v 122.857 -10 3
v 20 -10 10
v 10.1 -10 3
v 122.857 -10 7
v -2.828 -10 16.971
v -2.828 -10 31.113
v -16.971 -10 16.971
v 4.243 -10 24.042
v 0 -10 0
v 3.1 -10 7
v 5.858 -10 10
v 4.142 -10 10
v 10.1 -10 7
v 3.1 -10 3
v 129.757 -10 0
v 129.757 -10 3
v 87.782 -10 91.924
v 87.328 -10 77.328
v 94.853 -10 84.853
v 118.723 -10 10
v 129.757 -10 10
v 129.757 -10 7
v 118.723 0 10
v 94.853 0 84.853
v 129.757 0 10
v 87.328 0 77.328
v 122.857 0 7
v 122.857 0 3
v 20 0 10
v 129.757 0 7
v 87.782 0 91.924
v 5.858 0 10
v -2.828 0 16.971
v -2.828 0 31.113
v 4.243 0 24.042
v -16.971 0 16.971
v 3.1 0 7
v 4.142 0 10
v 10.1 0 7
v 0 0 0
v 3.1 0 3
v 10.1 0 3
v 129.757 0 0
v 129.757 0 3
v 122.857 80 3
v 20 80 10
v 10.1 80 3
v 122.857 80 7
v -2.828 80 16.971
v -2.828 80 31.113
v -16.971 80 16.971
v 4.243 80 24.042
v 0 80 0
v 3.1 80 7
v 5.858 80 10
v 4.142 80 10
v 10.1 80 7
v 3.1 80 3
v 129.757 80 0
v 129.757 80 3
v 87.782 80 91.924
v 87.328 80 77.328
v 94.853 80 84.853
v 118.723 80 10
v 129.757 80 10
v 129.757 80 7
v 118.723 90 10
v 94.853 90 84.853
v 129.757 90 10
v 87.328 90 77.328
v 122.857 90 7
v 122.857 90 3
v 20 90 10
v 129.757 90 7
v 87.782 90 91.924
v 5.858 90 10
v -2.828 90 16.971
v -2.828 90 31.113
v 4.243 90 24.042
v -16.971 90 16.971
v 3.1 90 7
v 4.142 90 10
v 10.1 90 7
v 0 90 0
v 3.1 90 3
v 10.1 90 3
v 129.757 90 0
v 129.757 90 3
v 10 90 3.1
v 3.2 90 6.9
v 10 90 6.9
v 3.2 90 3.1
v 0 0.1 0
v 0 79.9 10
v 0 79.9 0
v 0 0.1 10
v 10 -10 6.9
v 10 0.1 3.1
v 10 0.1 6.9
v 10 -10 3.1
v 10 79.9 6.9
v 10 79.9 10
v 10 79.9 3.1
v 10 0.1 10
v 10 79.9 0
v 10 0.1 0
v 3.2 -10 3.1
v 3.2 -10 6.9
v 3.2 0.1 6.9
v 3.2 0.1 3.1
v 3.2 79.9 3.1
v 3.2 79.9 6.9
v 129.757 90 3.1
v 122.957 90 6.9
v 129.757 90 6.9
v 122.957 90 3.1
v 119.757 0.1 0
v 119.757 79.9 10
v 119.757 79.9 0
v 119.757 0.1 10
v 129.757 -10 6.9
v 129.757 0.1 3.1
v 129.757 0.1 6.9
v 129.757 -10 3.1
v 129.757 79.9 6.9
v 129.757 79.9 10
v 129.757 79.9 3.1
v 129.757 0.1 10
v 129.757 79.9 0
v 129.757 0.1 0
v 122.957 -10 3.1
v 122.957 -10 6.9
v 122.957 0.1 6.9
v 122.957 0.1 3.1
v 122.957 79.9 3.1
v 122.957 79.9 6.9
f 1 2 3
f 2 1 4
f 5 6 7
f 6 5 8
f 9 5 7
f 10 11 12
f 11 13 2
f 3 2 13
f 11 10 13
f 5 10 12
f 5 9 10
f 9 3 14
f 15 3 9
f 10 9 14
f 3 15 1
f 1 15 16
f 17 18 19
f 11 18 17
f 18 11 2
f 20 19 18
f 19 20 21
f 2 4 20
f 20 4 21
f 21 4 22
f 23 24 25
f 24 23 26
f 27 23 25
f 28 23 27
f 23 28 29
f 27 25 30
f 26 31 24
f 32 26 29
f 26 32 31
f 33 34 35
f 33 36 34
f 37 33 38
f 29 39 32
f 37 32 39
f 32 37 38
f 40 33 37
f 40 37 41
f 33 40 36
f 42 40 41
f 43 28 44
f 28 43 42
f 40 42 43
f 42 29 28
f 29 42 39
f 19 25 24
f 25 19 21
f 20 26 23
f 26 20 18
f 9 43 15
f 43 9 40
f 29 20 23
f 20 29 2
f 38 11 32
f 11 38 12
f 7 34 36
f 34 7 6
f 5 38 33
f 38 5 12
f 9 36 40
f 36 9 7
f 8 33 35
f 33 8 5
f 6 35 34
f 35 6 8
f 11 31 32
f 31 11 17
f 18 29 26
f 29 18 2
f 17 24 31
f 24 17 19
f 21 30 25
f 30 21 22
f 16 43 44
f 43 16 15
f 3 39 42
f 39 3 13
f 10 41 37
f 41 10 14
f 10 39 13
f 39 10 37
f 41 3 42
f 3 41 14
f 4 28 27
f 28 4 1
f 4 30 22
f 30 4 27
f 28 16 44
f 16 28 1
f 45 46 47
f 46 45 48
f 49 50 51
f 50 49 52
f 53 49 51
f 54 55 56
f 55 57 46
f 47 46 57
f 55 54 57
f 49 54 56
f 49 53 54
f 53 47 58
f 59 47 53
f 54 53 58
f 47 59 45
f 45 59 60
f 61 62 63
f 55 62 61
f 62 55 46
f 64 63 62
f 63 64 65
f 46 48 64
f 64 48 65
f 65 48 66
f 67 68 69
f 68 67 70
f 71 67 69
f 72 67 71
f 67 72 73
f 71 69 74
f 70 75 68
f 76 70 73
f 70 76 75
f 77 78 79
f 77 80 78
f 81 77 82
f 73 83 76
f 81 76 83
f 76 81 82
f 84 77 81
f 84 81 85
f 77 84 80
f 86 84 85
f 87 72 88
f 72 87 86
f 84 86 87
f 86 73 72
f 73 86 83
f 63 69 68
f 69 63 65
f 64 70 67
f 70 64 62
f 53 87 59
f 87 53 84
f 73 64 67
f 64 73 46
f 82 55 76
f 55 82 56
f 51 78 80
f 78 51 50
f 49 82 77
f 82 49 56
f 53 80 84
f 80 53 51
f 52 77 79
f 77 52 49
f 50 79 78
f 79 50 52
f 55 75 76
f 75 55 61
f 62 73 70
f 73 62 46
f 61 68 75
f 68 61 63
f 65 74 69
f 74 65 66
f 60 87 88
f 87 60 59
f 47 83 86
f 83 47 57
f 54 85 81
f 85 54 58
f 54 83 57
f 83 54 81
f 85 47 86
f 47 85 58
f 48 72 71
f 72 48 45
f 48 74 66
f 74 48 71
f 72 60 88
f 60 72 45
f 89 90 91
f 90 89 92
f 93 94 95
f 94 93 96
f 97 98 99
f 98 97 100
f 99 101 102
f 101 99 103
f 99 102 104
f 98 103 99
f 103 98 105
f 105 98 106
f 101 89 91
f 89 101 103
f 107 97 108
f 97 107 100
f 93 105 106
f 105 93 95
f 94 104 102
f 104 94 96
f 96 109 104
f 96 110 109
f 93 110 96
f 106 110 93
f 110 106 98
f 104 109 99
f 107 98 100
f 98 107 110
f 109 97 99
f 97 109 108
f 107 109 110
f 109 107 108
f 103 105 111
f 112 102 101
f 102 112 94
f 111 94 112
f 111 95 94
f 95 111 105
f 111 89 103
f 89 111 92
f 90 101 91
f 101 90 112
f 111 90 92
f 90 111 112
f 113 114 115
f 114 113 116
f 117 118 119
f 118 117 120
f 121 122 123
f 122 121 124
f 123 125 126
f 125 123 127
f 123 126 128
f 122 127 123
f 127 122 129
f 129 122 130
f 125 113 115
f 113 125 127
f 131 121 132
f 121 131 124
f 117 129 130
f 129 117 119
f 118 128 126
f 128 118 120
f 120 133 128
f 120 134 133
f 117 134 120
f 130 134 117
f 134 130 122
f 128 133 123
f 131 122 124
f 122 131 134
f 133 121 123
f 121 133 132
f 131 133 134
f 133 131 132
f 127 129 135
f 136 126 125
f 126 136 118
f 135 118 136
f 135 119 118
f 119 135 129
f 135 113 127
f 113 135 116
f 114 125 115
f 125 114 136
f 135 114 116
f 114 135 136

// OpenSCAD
// [FL_INDEX: keywords="openscad, 3d_parametric, Customizable_iPad_Stand, csg_solid" | COT="Parametric OpenSCAD design from 3DCodeverse"]
// Title: Customizable iPad Stand


// preview[view:south west, tilt:top diagonal]

// Angle of iPad on stand;
Angle = 45; // [10:80]
// Angle of back support;
BackAngle = 25; // [10:80]
// Length of support
SupportLength = 120; // [50:240]
// Length of connecting bars
BarLength = 80; // [20:200]
Tolerance = 0.1; // [0, 0.1, 0.2, 0.3, 0.4, 0.5]


part = "Assembled"; // [Assembled: Assembled, Side: Side, Bar: Bar]


SubAngle = -(90-Angle);

SharedAngle = -SubAngle + BackAngle;
comp = (10/sin(SharedAngle));

truecomp = (SharedAngle > 90 ? comp : (SharedAngle == 90 ? 1 : 0));

echo(truecomp);


SubBackAngle = (90-BackAngle);

if(part=="Assembled")
{
	rotate([90, 0, 0]) Leg(Angle, BackAngle, SupportLength, Tolerance);
	
	translate([0, BarLength+10, 0])rotate([90, 0, 0]) Leg(Angle, BackAngle, SupportLength, Tolerance);
	rotate([-90, 0, 90]) translate([-10, -10, -10]) Bar(BarLength, Tolerance);
	rotate([-90, 0, 90]) translate([-10, -10, -10 - (cos(Angle)*SupportLength + sin(BackAngle)*(sin(Angle)*SupportLength)/cos(BackAngle)-10 + 10 - 10*tan(BackAngle))]) Bar(BarLength, Tolerance);
}
if(part=="Side")
{
	Leg(Angle, BackAngle, SupportLength, Tolerance);
}
if(part=="Bar")
{
	Bar(BarLength, Tolerance);
}

module Bar(BarLength, Tolerance)
{
	difference()
	{
		cube([BarLength+20, 10, 10]);
		translate([-0.5, 7 - Tolerance, -0.5]) cube([10.5+ Tolerance, 4 + Tolerance, 11]);
		translate([-0.5, -1 + Tolerance, -0.5]) cube([10.5+ Tolerance, 4, 11]);
		translate([-0.5, -0.5, 7 - Tolerance * 2]) cube([10.5+ Tolerance, 11, 4 + Tolerance * 2]);
		translate([BarLength+10 - Tolerance, 7 - Tolerance, -0.5]) cube([10.5 + Tolerance, 4 + Tolerance, 11]);
		translate([BarLength+10 - Tolerance, -1 + Tolerance, -0.5]) cube([10.5+ Tolerance, 4, 11]);
		translate([BarLength+10 - Tolerance, -0.5, 7 - Tolerance * 2]) cube([10.5+ Tolerance, 11, 4 + Tolerance * 2]);
	}
}

module Leg(Angle, BackAngle, SupportLength, Tolerance)
{
difference()
{
	union()
	{
		cube([10, 10, 10]);
		rotate([0, 0, SubAngle]) translate([-24, 0, 0]) cube([24, 10, 10]);
		rotate([0, 0, Angle]) translate([0, 14, 0]) cube([20, 10, 10]);
//		rotate([0, 0, SubAngle]) translate([-14, 10, 0]) %cube([10, 10, 10]);
		translate([10, 0, 0]) rotate([0, 0, Angle]) translate([0, 0, 0]) cube([SupportLength, 10, 10]);
		
		difference()
		{
			cube([cos(Angle)*SupportLength + sin(BackAngle)*(sin(Angle)*SupportLength)/cos(BackAngle) + 10 - 10*tan(BackAngle), 10, 10]);
//			translate([10, 0, 0]) rotate([0, 0, Angle]) translate([SupportLength, 0, 0]) rotate([0, 0, -Angle + BackAngle+90]) translate([(-sin(Angle)*SupportLength)/cos(BackAngle), -10, -0.5]) cube([(sin(Angle)*SupportLength)/cos(BackAngle), 10, 11]);
		}
		
		difference()
		{
			translate([10, 0, 0]) rotate([0, 0, Angle]) translate([SupportLength, 0, 0]) rotate([0, 0, -Angle + BackAngle+90]) translate([(-sin(Angle)*SupportLength)/cos(BackAngle), 0, 0]) cube([(sin(Angle)*SupportLength)/cos(BackAngle) + truecomp, 10, 10]);
			translate([0, -10, -0.5]) cube([cos(Angle)*SupportLength + sin(BackAngle)*(sin(Angle)*SupportLength)/cos(BackAngle) + 10*tan(SubBackAngle), 10, 11]);
		}
	}
	translate([3 + Tolerance, 3, -0.5]) cube([7, 4, 11]);
	translate([cos(Angle)*SupportLength + sin(BackAngle)*(sin(Angle)*SupportLength)/cos(BackAngle)- 7 + Tolerance + 10 - 10*tan(BackAngle), 3, -0.5]) cube([8, 4, 11]);
	translate([cos(Angle)*SupportLength + sin(BackAngle)*(sin(Angle)*SupportLength)/cos(BackAngle) + 10 - 10*tan(BackAngle), -10, -0.5]) cube([20, 20, 11]);
}
}
